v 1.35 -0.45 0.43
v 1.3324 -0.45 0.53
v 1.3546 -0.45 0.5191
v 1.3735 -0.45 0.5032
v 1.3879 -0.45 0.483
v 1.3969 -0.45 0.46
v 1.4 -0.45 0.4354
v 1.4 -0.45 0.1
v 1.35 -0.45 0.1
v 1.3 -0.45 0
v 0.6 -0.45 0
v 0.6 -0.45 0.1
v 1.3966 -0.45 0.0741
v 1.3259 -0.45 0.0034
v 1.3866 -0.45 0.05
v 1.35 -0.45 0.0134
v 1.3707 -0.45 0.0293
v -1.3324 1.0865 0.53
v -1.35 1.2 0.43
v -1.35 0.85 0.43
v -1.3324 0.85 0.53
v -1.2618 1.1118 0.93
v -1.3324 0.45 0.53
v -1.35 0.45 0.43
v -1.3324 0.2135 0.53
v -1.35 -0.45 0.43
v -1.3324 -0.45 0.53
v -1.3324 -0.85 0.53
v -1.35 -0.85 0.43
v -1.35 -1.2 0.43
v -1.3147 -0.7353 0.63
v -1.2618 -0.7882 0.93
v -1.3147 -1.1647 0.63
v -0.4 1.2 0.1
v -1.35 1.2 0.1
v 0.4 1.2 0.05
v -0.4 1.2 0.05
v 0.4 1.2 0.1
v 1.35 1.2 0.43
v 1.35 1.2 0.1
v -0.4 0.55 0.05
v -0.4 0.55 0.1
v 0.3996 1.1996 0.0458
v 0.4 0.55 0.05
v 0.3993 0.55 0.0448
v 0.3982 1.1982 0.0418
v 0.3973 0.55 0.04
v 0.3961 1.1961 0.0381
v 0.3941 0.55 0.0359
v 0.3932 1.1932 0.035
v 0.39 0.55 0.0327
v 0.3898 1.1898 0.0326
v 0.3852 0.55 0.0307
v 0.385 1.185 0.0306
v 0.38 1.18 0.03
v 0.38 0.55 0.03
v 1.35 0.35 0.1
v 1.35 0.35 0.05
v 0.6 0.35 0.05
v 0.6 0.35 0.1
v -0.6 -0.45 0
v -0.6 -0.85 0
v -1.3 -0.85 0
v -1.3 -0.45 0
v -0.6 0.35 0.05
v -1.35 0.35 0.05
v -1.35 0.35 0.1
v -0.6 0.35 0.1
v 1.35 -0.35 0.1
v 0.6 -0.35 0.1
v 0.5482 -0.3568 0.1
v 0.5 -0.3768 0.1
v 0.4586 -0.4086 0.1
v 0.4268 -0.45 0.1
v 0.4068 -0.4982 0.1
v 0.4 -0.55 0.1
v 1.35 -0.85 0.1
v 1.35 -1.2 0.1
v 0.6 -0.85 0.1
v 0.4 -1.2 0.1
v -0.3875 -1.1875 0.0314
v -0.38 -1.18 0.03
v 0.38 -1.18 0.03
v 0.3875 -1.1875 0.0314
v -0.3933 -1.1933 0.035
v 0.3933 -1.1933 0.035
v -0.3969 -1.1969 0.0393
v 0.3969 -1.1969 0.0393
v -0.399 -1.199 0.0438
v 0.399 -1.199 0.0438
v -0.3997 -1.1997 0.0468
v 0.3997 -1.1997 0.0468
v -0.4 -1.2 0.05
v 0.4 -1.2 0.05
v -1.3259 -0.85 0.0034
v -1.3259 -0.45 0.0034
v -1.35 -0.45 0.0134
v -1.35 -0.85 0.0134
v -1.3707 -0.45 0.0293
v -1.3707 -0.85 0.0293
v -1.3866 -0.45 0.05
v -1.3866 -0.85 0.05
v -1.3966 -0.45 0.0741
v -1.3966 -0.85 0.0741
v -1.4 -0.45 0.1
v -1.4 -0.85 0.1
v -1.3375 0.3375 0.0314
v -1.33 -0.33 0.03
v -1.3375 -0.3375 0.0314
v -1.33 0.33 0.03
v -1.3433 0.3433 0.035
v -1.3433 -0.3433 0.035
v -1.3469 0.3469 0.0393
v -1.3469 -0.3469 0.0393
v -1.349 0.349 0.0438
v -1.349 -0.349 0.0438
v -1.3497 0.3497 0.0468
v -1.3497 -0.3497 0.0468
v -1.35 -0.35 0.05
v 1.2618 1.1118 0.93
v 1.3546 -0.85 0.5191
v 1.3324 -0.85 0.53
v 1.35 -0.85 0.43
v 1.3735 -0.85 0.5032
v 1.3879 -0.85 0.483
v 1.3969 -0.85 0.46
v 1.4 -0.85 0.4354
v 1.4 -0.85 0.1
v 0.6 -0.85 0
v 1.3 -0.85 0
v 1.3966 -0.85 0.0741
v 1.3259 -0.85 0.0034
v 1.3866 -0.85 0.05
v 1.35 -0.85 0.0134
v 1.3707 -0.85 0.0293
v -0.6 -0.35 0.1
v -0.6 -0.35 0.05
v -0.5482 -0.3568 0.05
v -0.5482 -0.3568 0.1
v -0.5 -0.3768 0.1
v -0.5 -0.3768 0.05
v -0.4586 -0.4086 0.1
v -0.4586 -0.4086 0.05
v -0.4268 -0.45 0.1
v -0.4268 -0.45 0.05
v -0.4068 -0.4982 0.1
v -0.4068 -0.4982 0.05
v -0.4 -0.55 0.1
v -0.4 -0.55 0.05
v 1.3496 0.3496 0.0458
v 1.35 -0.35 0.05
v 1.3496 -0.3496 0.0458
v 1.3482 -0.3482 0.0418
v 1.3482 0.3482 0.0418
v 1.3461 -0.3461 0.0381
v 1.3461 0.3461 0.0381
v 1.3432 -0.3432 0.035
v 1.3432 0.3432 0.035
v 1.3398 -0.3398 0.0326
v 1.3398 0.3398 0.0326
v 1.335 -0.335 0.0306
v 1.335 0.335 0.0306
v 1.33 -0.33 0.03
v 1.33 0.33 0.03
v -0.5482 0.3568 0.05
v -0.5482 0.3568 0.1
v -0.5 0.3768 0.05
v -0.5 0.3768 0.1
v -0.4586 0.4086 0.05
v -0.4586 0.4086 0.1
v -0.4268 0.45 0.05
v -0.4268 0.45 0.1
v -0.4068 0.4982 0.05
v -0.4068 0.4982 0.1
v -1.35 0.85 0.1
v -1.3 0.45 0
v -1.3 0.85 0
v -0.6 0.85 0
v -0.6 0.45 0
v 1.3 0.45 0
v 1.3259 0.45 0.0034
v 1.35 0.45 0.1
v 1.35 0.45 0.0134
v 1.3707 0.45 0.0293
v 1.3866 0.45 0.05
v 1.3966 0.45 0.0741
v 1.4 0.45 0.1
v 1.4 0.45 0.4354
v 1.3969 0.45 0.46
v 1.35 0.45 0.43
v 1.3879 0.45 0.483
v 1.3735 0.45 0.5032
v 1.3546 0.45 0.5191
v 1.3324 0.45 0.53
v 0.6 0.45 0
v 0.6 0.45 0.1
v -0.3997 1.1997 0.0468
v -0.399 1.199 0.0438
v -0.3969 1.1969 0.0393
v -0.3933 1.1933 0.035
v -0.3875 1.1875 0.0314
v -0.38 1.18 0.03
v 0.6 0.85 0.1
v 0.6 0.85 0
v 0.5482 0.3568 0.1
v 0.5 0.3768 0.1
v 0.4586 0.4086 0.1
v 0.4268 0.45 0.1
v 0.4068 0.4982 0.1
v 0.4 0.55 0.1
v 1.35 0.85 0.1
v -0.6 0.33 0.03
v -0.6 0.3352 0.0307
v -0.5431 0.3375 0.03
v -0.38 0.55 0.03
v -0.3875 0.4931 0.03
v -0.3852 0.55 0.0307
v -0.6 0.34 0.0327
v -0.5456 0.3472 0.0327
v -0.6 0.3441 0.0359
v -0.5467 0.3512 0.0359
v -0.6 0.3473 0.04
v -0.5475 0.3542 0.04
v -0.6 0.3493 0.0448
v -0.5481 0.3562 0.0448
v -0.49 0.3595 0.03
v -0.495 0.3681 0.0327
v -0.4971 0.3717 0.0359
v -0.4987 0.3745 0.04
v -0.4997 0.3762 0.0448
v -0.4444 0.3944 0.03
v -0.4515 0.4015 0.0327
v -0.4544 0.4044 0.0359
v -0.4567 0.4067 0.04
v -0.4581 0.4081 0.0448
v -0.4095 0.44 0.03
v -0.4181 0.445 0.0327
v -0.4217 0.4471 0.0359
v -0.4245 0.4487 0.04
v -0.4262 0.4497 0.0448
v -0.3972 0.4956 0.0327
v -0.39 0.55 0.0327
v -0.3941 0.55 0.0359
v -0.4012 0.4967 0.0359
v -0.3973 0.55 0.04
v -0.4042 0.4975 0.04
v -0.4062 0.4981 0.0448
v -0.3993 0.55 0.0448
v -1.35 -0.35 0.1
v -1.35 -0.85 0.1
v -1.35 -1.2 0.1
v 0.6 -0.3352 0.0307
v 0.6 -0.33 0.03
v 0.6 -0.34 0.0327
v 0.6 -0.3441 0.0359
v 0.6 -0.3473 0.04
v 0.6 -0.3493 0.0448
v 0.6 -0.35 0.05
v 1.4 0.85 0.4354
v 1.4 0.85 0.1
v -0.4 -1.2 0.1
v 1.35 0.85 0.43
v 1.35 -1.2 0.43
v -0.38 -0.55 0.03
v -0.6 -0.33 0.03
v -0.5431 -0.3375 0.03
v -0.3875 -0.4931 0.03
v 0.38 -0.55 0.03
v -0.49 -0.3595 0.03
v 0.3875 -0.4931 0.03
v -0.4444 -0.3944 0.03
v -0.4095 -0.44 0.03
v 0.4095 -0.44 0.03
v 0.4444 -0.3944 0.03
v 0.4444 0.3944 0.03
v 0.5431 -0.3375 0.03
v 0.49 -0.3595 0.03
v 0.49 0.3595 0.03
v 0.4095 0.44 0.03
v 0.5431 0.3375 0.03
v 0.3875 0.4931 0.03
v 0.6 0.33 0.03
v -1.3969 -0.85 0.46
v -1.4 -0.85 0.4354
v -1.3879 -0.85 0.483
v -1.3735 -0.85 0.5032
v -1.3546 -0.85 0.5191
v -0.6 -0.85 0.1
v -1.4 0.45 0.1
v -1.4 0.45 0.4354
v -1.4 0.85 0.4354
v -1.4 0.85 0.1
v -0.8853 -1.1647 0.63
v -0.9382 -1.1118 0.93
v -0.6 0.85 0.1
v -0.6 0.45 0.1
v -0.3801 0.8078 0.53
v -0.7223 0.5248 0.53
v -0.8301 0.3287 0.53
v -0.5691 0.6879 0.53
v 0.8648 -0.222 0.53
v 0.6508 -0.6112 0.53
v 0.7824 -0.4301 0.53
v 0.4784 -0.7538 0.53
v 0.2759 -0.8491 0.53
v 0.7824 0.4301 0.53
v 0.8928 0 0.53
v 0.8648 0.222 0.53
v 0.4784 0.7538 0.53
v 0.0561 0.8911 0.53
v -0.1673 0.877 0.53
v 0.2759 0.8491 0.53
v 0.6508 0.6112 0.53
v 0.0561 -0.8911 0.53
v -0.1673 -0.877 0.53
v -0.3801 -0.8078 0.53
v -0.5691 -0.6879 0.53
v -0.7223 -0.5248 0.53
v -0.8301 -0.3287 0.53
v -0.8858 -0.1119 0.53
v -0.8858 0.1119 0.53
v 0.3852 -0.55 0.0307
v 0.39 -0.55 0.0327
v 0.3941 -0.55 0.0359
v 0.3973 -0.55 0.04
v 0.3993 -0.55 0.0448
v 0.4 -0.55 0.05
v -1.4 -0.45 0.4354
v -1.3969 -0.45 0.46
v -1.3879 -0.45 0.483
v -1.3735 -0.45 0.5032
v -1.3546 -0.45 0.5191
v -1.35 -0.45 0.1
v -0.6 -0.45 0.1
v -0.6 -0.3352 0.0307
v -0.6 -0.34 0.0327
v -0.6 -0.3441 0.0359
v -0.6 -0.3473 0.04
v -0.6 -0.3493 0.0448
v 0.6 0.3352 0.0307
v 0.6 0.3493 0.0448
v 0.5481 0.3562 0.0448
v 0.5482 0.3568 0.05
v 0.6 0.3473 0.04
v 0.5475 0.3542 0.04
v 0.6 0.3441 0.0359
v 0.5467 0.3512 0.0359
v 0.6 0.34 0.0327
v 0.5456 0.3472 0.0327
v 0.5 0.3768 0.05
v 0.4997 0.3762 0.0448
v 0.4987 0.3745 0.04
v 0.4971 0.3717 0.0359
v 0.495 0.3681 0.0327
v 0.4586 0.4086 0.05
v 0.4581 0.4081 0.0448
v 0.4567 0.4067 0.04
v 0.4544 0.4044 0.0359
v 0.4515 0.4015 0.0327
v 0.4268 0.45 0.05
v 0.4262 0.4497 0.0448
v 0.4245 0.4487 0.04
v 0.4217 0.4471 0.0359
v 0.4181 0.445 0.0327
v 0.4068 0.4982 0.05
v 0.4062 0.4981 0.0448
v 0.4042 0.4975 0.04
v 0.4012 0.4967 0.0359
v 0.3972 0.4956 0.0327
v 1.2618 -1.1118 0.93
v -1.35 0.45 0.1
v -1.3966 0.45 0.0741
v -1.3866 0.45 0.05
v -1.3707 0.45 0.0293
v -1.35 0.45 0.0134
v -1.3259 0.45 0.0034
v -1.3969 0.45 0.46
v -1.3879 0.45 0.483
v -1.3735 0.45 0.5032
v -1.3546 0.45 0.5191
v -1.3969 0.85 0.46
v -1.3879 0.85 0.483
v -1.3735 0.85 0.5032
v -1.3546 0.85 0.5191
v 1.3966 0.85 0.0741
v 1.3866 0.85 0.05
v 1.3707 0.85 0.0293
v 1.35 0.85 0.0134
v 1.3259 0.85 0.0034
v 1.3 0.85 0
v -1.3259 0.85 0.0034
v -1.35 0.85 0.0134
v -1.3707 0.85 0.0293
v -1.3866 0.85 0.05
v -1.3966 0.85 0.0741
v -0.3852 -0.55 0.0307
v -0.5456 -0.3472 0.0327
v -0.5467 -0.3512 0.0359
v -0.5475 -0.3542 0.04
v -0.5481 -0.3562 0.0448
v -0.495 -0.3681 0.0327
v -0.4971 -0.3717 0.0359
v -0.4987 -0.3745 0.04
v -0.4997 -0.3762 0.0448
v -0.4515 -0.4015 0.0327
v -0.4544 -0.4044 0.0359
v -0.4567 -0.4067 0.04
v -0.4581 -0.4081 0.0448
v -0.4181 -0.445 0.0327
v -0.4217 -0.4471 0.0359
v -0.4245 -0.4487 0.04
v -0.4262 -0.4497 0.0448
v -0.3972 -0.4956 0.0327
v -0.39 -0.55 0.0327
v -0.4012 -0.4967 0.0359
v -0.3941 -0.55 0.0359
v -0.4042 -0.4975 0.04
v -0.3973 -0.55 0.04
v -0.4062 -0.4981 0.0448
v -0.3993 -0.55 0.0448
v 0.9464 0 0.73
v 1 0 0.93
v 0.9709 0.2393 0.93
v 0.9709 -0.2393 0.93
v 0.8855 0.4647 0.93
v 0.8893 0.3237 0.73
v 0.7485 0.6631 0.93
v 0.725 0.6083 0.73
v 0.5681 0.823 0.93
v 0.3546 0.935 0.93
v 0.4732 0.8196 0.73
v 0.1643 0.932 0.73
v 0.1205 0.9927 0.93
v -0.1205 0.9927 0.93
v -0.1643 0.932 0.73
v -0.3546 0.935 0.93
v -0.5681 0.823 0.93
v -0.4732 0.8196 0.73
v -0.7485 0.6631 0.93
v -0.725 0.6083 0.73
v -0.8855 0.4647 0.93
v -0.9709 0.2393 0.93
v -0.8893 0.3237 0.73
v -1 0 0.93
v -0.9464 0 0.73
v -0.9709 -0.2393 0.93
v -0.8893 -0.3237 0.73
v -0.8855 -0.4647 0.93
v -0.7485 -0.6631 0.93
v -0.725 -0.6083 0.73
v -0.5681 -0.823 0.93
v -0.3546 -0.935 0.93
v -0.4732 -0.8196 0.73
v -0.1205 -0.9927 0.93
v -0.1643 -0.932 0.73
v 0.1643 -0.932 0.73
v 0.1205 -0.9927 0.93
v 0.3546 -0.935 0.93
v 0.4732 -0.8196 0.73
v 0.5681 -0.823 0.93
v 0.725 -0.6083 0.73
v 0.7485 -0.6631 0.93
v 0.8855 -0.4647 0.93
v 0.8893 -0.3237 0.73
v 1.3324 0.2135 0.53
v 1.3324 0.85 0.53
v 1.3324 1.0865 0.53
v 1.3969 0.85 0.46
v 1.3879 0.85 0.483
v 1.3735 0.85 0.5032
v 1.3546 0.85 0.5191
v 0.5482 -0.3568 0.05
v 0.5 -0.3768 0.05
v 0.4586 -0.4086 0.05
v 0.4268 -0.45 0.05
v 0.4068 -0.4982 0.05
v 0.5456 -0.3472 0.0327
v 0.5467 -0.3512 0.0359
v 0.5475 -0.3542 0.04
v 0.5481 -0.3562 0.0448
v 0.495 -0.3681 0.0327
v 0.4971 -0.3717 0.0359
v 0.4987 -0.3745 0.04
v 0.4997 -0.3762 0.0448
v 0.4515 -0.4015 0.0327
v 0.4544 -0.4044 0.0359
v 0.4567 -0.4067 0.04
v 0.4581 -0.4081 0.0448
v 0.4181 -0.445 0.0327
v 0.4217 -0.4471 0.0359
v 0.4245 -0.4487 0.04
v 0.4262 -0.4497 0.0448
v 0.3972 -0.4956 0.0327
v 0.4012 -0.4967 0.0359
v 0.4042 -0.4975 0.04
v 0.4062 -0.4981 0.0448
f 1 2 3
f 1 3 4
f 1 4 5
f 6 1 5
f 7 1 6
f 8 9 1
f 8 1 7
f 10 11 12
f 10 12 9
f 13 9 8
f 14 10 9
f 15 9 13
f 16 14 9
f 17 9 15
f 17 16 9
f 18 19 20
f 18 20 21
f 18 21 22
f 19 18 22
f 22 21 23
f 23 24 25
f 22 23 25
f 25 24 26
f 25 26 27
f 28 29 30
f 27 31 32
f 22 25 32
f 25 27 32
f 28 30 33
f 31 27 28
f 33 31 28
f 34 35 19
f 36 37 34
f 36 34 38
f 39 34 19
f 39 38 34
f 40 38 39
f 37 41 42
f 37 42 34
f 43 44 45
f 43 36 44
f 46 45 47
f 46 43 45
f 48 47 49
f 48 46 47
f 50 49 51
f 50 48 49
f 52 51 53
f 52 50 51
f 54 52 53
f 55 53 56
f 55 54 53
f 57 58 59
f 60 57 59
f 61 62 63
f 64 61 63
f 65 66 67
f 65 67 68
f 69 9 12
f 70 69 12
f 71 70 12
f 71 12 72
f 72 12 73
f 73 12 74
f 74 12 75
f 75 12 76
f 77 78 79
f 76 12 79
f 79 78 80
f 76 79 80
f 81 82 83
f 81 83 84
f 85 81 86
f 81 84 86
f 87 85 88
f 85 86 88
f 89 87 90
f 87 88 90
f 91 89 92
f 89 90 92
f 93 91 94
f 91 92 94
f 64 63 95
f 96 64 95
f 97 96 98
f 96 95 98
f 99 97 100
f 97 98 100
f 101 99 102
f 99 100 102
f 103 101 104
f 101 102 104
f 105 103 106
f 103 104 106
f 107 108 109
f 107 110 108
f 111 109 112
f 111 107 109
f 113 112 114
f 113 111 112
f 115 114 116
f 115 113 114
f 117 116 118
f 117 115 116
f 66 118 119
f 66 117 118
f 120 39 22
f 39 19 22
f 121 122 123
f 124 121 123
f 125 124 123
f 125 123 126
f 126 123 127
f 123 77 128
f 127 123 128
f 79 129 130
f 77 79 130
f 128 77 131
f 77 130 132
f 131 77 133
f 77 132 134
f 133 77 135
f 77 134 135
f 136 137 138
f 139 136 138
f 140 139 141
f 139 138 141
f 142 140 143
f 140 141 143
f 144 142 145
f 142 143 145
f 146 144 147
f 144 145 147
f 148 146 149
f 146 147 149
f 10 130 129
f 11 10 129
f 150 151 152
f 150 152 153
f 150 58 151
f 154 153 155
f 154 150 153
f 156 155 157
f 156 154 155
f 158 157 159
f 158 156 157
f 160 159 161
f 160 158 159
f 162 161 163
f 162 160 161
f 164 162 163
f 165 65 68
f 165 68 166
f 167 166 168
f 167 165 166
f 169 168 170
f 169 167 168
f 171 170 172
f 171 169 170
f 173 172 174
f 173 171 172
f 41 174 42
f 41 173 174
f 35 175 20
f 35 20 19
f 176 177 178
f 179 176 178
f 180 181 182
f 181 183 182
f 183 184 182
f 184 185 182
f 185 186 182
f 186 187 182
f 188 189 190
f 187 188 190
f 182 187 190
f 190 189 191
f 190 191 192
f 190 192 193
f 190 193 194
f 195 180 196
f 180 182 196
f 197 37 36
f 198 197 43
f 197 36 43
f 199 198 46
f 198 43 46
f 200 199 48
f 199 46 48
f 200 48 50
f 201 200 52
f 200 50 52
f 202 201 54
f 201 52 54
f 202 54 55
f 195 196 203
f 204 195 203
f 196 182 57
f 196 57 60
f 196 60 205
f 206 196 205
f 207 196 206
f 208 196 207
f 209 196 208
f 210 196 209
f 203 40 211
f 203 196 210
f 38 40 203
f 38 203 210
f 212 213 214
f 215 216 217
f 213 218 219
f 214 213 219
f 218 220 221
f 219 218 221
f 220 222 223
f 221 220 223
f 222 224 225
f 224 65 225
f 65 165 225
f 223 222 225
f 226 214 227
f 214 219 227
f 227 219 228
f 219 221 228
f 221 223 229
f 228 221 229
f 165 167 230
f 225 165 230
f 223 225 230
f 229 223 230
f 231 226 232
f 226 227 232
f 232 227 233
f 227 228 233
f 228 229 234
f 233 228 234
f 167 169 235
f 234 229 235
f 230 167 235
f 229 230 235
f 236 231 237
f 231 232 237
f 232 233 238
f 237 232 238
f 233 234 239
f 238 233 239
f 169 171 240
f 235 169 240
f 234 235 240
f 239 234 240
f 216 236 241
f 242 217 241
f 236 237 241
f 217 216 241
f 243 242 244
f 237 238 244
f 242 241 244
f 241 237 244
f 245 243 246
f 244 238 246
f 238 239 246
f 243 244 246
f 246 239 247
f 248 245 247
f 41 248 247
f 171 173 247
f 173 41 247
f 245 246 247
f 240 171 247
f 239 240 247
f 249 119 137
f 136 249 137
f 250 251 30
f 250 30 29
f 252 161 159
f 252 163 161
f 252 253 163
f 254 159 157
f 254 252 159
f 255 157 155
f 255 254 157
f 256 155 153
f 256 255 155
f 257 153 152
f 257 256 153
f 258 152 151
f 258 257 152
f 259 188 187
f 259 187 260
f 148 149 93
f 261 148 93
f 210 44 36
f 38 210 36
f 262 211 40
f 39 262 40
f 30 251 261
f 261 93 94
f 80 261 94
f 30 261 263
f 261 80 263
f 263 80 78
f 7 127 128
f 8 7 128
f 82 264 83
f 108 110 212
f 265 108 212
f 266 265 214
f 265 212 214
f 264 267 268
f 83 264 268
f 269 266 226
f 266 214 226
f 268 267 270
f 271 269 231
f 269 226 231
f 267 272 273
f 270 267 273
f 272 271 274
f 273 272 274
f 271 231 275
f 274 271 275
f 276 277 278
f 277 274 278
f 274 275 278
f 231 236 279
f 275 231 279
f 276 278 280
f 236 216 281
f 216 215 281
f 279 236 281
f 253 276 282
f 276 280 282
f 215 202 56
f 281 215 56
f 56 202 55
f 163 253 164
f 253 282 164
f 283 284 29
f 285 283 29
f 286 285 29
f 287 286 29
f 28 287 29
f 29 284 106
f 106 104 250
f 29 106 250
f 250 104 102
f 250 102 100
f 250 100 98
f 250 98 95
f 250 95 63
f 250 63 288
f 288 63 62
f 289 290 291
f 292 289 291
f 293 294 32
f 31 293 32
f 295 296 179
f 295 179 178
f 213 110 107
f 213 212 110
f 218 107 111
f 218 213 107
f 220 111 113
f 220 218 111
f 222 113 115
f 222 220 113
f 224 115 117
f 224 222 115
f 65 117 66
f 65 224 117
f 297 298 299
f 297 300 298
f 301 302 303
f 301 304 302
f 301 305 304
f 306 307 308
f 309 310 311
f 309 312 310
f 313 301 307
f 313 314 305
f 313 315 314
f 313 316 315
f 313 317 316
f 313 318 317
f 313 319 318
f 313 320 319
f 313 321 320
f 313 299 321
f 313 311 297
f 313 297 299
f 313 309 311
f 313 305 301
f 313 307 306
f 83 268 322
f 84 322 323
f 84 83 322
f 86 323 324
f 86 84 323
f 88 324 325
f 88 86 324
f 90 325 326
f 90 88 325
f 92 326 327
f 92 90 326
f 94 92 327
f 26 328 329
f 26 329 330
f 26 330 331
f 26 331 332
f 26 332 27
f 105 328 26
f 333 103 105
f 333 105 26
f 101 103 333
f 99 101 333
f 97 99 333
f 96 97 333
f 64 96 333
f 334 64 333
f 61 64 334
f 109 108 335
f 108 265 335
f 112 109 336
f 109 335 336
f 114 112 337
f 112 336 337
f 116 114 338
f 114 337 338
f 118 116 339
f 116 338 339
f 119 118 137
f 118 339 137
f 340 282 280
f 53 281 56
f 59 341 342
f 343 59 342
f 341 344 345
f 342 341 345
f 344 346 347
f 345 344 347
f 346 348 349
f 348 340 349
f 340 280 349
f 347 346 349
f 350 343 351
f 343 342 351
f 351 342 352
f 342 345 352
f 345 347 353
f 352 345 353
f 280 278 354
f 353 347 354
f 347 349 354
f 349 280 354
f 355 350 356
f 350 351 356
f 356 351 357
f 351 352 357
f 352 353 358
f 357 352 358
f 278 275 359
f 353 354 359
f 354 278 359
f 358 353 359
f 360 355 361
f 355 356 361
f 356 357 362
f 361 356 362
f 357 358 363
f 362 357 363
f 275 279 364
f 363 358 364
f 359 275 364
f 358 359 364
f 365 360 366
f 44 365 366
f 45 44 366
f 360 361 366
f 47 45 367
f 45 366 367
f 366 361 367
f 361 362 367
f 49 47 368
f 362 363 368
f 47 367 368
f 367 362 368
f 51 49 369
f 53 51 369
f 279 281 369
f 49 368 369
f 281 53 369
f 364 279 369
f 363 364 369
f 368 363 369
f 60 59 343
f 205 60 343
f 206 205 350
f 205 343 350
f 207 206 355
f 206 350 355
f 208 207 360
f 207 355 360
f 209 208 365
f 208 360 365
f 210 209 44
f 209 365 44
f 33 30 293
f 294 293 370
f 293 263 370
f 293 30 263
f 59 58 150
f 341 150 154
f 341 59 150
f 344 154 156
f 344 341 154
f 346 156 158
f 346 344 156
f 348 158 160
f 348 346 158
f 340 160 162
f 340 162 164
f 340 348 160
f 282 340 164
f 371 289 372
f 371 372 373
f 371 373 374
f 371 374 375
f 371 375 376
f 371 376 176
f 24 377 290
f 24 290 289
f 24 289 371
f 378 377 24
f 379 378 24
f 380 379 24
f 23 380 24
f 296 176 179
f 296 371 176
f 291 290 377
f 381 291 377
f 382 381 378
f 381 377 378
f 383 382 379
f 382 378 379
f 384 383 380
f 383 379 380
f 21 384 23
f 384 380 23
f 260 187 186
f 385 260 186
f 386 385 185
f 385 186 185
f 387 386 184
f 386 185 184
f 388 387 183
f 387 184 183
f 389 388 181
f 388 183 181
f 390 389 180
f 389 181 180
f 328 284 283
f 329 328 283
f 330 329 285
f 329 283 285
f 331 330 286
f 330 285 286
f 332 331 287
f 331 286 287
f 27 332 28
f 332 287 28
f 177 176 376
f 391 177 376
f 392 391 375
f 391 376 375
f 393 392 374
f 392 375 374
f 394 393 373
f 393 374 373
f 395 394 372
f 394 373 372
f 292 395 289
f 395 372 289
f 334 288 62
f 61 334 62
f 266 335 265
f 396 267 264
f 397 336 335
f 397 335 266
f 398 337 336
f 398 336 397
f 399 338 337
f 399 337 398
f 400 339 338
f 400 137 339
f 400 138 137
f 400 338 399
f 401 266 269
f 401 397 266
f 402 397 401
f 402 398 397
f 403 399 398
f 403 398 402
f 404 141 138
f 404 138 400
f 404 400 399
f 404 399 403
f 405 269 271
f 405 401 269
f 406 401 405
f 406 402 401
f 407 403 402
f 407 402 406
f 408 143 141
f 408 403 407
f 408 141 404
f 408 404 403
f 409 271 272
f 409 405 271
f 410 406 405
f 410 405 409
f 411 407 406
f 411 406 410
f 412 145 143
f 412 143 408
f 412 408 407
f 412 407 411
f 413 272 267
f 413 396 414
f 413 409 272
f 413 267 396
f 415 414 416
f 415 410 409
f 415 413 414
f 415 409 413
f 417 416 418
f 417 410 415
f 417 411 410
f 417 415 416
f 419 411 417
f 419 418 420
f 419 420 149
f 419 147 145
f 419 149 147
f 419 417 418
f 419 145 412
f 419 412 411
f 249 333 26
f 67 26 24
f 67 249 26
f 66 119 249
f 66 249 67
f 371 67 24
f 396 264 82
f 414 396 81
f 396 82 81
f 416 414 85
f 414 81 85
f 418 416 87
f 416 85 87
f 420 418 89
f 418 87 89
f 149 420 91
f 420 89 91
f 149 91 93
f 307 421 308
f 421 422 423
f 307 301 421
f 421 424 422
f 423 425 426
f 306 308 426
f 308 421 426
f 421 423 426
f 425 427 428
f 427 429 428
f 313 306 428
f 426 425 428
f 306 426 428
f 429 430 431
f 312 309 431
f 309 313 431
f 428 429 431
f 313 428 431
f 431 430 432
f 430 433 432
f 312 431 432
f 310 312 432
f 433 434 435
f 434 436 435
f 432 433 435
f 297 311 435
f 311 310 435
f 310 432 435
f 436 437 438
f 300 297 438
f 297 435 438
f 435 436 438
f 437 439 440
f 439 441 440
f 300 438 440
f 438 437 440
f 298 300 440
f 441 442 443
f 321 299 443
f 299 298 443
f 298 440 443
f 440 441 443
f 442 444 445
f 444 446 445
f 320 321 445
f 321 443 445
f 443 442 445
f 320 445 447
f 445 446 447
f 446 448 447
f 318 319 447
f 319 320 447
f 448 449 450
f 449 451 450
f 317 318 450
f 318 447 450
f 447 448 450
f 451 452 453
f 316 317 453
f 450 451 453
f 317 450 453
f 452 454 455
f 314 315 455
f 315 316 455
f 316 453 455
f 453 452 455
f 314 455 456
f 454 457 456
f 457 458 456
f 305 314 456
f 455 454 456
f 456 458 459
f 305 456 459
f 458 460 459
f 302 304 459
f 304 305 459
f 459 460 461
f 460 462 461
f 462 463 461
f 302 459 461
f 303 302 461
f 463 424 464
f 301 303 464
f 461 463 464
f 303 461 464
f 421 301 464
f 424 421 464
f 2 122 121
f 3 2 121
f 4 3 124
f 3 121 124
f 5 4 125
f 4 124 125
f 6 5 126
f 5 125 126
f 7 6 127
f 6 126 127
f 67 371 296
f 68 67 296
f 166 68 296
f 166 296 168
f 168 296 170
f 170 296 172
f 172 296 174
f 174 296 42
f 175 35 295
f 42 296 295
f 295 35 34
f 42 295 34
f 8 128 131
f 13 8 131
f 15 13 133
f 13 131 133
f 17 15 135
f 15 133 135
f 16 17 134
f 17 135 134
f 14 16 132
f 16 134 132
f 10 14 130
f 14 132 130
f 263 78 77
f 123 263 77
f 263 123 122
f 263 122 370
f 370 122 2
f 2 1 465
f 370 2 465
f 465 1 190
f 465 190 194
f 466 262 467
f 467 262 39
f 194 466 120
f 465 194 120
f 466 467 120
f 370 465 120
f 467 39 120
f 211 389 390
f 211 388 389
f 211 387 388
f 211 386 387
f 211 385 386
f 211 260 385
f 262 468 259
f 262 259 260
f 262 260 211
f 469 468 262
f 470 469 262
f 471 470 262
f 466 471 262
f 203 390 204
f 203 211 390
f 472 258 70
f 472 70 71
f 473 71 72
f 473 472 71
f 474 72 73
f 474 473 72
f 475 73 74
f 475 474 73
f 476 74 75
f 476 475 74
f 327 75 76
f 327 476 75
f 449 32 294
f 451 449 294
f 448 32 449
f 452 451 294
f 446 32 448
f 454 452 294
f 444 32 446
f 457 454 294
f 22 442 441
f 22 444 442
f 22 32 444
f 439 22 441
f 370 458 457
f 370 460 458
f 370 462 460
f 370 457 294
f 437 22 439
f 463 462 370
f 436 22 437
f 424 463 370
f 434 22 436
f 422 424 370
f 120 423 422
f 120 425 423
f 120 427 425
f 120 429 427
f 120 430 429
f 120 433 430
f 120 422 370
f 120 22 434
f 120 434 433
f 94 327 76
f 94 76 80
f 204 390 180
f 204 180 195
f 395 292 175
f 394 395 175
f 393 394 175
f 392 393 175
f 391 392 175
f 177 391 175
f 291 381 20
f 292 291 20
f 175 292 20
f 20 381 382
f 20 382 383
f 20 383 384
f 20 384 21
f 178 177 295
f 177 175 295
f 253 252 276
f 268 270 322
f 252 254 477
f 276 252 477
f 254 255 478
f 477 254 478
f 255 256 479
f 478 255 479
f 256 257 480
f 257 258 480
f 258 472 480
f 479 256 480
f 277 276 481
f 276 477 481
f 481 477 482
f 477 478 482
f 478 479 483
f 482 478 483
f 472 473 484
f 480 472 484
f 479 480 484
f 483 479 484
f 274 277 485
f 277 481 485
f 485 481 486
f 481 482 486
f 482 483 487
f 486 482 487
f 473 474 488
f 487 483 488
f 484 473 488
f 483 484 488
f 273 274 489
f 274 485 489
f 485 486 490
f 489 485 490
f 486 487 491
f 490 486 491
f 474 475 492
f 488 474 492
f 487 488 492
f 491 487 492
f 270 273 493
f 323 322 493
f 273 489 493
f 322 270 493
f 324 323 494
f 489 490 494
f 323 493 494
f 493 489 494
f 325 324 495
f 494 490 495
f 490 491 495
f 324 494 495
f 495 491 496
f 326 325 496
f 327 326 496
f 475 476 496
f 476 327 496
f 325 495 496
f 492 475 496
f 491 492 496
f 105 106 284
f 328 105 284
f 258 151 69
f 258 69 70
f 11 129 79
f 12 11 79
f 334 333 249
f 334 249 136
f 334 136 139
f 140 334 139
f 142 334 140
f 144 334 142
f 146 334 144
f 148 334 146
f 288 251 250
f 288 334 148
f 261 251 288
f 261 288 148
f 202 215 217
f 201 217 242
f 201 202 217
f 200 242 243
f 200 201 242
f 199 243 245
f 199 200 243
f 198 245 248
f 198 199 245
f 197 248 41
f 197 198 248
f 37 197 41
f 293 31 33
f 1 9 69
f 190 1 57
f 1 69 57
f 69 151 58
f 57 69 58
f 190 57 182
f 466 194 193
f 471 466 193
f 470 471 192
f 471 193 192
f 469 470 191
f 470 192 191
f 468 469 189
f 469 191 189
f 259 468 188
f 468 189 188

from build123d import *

# Parameters (mm, degrees)
BOSS_EXTRUDE1_START  = 0.03
SKETCH1_W            = 2.7
SKETCH1_H            = 2.4
BOSS_EXTRUDE1_DEPTH  = 0.4
BOSS_EXTRUDE2_START  = 0.43
SKETCH1_2_W          = 2.7
SKETCH1_2_H          = 2.4
BOSS_EXTRUDE2_DEPTH  = 0.5
BOSS_EXTRUDE2_TAPER  = 10
CUT_EXTRUDE1_DEPTH   = 0.3
SKETCH3_R            = 1
CUT_EXTRUDE2_DEPTH   = 0.4
CUT_EXTRUDE2_DRAFT   = -15
CUT_EXTRUDE3_DEPTH   = 0.07
BOSS_EXTRUDE3_START  = -0.5
SKETCH4_W            = 0.8
SKETCH4_H            = 0.4
BOSS_EXTRUDE3_DEPTH  = 0.53
FILLET2_R            = 0.1
MIRROR2_COPY_1_DEPTH = 0.07
FILLET1_R            = 0.02
FILLET2_OF_MIRROR3_R = 0.1
MIRROR4_START        = -0.85
MIRROR4_DEPTH        = 0.4


# Read off the part's stored shape, not the designer's step: Mirror4
with BuildPart() as part:
    # Sketch1 → Boss-Extrude1 (new body)
    with BuildSketch(Plane.XY.offset(BOSS_EXTRUDE1_START)):
        Rectangle(SKETCH1_W, SKETCH1_H)
    extrude(amount=BOSS_EXTRUDE1_DEPTH)

    # Sketch1<2> → Boss-Extrude2 (add)
    with BuildSketch(Plane.XY.offset(BOSS_EXTRUDE2_START)):
        Rectangle(SKETCH1_2_W, SKETCH1_2_H)
    extrude(amount=BOSS_EXTRUDE2_DEPTH, taper=BOSS_EXTRUDE2_TAPER)

    # Sketch2 → Cut-Extrude1 (cut)
    with BuildSketch(Plane.XY.offset(0.93)):
        Polygon((-0.85, -1.2), (-1.35, -0.7), (-1.35, -1.2), align=None)
    extrude(amount=-CUT_EXTRUDE1_DEPTH, mode=Mode.SUBTRACT)


with BuildPart() as cut_extrude2_tool:
    # Sketch3 → Cut-Extrude2 (with draft: the straight prism first)
    with BuildSketch(Plane.XY.offset(0.93)):
        Circle(SKETCH3_R)
    extrude(amount=-CUT_EXTRUDE2_DEPTH)
    # Cut-Extrude2: the draft: its side faces are tilted about the plane it starts from
    cut_extrude2_sides = [cut_extrude2_tool.faces().sort_by_distance(p)[0] for p in [
        (-1, 0, 0.73),
    ]]
    draft(cut_extrude2_sides, Plane.XY.offset(0.93), CUT_EXTRUDE2_DRAFT)


with BuildPart() as part_1:
    add(part.part)

    # Cut-Extrude2: cut by cut_extrude2_tool
    add(cut_extrude2_tool.part, mode=Mode.SUBTRACT)

    # Sketch5 → Cut-Extrude3 (cut)
    with BuildSketch(Plane(origin=(0, 0, 0.03), x_dir=(-1, 0, 0), z_dir=(0, 0, -1))):
        with BuildLine():
            Line((-1.35, 0.35), (-0.6, 0.35))
            ThreePointArc((-0.6, 0.35), (-0.458578644, 0.408578644), (-0.4, 0.55))
            Line((-0.4, 0.55), (-0.4, 1.2))
            Line((-0.4, 1.2), (-1.35, 1.2))
            Line((-1.35, 1.2), (-1.35, 0.35))
        make_face()
    cut_extrude3 = extrude(amount=-CUT_EXTRUDE3_DEPTH, mode=Mode.SUBTRACT)

    # Sketch4 → Boss-Extrude3 (add)
    with BuildSketch(Plane(origin=(0, 0, 0.03), x_dir=(-1, 0, 0), z_dir=(0, 0, -1)).offset(BOSS_EXTRUDE3_START)):
        with Locations((-1, 0.65)):
            Rectangle(SKETCH4_W, SKETCH4_H)
    boss_extrude3 = extrude(amount=BOSS_EXTRUDE3_DEPTH)

    # Fillet2
    # the kernel refuses this fillet: 0.1 mm, written as the material it takes off along each edge
    with BuildSketch(Plane(origin=(1.4, 0.21345775, 0.53), x_dir=(0, 0, -1), z_dir=(0, 1, 0))) as fillet2_piece_1:
        with BuildLine():
            CenterArc((0.0946169, 0.1), FILLET2_R, 198.885199637, 71.114800363)
            Line((0, 0.067632698), (-0.001892338, 0.066985352))
            ThreePointArc((-0.001892338, 0.066985352), (-0.002, 0.033816349), (-0.002, 0))
            Line((-0.002, 0), (0, -0.002))
            Line((0, -0.002), (0.0946169, -0.002))
            Line((0.0946169, -0.002), (0.0946169, 0))
        make_face()
    extrude(amount=0.8730845, mode=Mode.SUBTRACT)
    with BuildSketch(Plane(origin=(1.4, 0.2, 0), x_dir=(0, 0, 1), z_dir=(0, 1, 0))) as fillet2_piece_2:
        with BuildLine():
            CenterArc((FILLET2_R, -FILLET2_R), FILLET2_R, 90, 90)
            Line((0, -FILLET2_R), (-FILLET2_R * 0.02, -FILLET2_R))
            Line((-FILLET2_R * 0.02, -FILLET2_R), (-FILLET2_R * 0.02, FILLET2_R * 0.02))
            Line((-FILLET2_R * 0.02, FILLET2_R * 0.02), (FILLET2_R, FILLET2_R * 0.02))
            Line((FILLET2_R, FILLET2_R * 0.02), (FILLET2_R, 0))
        make_face()
    extrude(amount=0.9, mode=Mode.SUBTRACT)

    # Mirror1: Cut-Extrude3 across plane
    add(cut_extrude3.mirror(Plane(origin=(0, 0, 0), x_dir=(0, 0, 1), z_dir=(1, 0, 0))), mode=Mode.SUBTRACT)

    # Mirror2: Cut-Extrude3 across plane
    add(cut_extrude3.mirror(Plane.ZX), mode=Mode.SUBTRACT)

    # Mirror2 copy 1 sketch → Mirror2 copy 1 (cut)
    with BuildSketch(Plane(origin=(0, 0, 0.03), x_dir=(1, 0, 0), z_dir=(0, 0, -1))):
        with BuildLine():
            Line((-1.35, 0.35), (-0.6, 0.35))
            ThreePointArc((-0.6, 0.35), (-0.458578644, 0.408578644), (-0.4, 0.55))
            Line((-0.4, 0.55), (-0.4, 1.2))
            Line((-0.4, 1.2), (-1.35, 1.2))
            Line((-1.35, 1.2), (-1.35, 0.35))
        make_face()
    extrude(amount=-MIRROR2_COPY_1_DEPTH, mode=Mode.SUBTRACT)

    # Fillet1
    fillet1_edges = [part_1.edges().sort_by_distance(p)[0] for p in [
        (-1.35, 0, 0.03),
        (-0.458578644, 0.408578644, 0.03),
        (-0.4, 0.875, 0.03),
        (-0.975, 0.35, 0.03),
        (0, -1.2, 0.03),
        (-0.458578644, -0.408578644, 0.03),
        (-0.4, -0.875, 0.03),
        (-0.975, -0.35, 0.03),
        (1.35, 0, 0.03),
        (0.458578644, -0.408578644, 0.03),
        (0.4, -0.875, 0.03),
        (0.975, -0.35, 0.03),
        (0, 1.2, 0.03),
        (0.458578644, 0.408578644, 0.03),
        (0.4, 0.875, 0.03),
        (0.975, 0.35, 0.03),
    ]]
    fillet(fillet1_edges, radius=FILLET1_R)

    # Mirror3: Boss-Extrude3 across plane
    add(boss_extrude3.mirror(Plane(origin=(0, 0, 0), x_dir=(0, 0, 1), z_dir=(1, 0, 0))))

    # Fillet2 of Mirror3
    # the kernel refuses this fillet: 0.1 mm, written as the material it takes off along each edge
    with BuildSketch(Plane(origin=(-1.4, 0.21345775, 0.53), x_dir=(0, 0, -1), z_dir=(0, 1, 0))) as fillet2_of_mirror3_piece_1:
        with BuildLine():
            CenterArc((0.0946169, -0.1), FILLET2_OF_MIRROR3_R, 90, 71.114800363)
            Line((0, -0.067632698), (-0.001892338, -0.066985352))
            ThreePointArc((-0.001892338, -0.066985352), (-0.002, -0.033816349), (-0.002, 0))
            Line((-0.002, 0), (0, 0.002))
            Line((0, 0.002), (0.0946169, 0.002))
            Line((0.0946169, 0.002), (0.0946169, 0))
        make_face()
    extrude(amount=0.8730845, mode=Mode.SUBTRACT)
    with BuildSketch(Plane(origin=(-1.4, 0.2, 0), x_dir=(0, 0, 1), z_dir=(0, 1, 0))) as fillet2_of_mirror3_piece_2:
        with BuildLine():
            CenterArc((FILLET2_OF_MIRROR3_R, FILLET2_OF_MIRROR3_R), FILLET2_OF_MIRROR3_R, 180, 90)
            Line((0, FILLET2_OF_MIRROR3_R), (-FILLET2_OF_MIRROR3_R * 0.02, FILLET2_OF_MIRROR3_R))
            Line((-FILLET2_OF_MIRROR3_R * 0.02, FILLET2_OF_MIRROR3_R), (-FILLET2_OF_MIRROR3_R * 0.02, -FILLET2_OF_MIRROR3_R * 0.02))
            Line((-FILLET2_OF_MIRROR3_R * 0.02, -FILLET2_OF_MIRROR3_R * 0.02), (FILLET2_OF_MIRROR3_R, -FILLET2_OF_MIRROR3_R * 0.02))
            Line((FILLET2_OF_MIRROR3_R, -FILLET2_OF_MIRROR3_R * 0.02), (FILLET2_OF_MIRROR3_R, 0))
        make_face()
    extrude(amount=0.9, mode=Mode.SUBTRACT)

    # Mirror4 outline → Mirror4 (add)
    with BuildSketch(Plane(origin=(0, 0, 0), x_dir=(1, 0, 0), z_dir=(0, 1, 0)).offset(MIRROR4_START)):
        with BuildLine():
            Line((1.4, -0.4353831), (1.4, -0.1))
            ThreePointArc((1.4, -0.1), (1.370710678, -0.029289322), (1.3, 0))
            Line((1.3, 0), (0.6, 0))
            Line((0.6, 0), (0.6, -0.1))
            Line((0.6, -0.1), (1.35, -0.1))
            Line((1.35, -0.1), (1.35, -0.43))
            Line((1.35, -0.43), (1.332367302, -0.53))
            ThreePointArc((1.332367302, -0.53), (1.381353335, -0.493534926), (1.4, -0.4353831))
        make_face()
        with BuildLine():
            Line((-0.6, 0), (-1.3, 0))
            ThreePointArc((-1.3, 0), (-1.370710678, -0.029289322), (-1.4, -0.1))
            Line((-1.4, -0.1), (-1.4, -0.4353831))
            ThreePointArc((-1.4, -0.4353831), (-1.381353335, -0.493534926), (-1.332367302, -0.53))
            Line((-1.332367302, -0.53), (-1.35, -0.43))
            Line((-1.35, -0.43), (-1.35, -0.1))
            Line((-1.35, -0.1), (-0.6, -0.1))
            Line((-0.6, -0.1), (-0.6, 0))
        make_face()
    extrude(amount=MIRROR4_DEPTH)


solid = part_1.part
